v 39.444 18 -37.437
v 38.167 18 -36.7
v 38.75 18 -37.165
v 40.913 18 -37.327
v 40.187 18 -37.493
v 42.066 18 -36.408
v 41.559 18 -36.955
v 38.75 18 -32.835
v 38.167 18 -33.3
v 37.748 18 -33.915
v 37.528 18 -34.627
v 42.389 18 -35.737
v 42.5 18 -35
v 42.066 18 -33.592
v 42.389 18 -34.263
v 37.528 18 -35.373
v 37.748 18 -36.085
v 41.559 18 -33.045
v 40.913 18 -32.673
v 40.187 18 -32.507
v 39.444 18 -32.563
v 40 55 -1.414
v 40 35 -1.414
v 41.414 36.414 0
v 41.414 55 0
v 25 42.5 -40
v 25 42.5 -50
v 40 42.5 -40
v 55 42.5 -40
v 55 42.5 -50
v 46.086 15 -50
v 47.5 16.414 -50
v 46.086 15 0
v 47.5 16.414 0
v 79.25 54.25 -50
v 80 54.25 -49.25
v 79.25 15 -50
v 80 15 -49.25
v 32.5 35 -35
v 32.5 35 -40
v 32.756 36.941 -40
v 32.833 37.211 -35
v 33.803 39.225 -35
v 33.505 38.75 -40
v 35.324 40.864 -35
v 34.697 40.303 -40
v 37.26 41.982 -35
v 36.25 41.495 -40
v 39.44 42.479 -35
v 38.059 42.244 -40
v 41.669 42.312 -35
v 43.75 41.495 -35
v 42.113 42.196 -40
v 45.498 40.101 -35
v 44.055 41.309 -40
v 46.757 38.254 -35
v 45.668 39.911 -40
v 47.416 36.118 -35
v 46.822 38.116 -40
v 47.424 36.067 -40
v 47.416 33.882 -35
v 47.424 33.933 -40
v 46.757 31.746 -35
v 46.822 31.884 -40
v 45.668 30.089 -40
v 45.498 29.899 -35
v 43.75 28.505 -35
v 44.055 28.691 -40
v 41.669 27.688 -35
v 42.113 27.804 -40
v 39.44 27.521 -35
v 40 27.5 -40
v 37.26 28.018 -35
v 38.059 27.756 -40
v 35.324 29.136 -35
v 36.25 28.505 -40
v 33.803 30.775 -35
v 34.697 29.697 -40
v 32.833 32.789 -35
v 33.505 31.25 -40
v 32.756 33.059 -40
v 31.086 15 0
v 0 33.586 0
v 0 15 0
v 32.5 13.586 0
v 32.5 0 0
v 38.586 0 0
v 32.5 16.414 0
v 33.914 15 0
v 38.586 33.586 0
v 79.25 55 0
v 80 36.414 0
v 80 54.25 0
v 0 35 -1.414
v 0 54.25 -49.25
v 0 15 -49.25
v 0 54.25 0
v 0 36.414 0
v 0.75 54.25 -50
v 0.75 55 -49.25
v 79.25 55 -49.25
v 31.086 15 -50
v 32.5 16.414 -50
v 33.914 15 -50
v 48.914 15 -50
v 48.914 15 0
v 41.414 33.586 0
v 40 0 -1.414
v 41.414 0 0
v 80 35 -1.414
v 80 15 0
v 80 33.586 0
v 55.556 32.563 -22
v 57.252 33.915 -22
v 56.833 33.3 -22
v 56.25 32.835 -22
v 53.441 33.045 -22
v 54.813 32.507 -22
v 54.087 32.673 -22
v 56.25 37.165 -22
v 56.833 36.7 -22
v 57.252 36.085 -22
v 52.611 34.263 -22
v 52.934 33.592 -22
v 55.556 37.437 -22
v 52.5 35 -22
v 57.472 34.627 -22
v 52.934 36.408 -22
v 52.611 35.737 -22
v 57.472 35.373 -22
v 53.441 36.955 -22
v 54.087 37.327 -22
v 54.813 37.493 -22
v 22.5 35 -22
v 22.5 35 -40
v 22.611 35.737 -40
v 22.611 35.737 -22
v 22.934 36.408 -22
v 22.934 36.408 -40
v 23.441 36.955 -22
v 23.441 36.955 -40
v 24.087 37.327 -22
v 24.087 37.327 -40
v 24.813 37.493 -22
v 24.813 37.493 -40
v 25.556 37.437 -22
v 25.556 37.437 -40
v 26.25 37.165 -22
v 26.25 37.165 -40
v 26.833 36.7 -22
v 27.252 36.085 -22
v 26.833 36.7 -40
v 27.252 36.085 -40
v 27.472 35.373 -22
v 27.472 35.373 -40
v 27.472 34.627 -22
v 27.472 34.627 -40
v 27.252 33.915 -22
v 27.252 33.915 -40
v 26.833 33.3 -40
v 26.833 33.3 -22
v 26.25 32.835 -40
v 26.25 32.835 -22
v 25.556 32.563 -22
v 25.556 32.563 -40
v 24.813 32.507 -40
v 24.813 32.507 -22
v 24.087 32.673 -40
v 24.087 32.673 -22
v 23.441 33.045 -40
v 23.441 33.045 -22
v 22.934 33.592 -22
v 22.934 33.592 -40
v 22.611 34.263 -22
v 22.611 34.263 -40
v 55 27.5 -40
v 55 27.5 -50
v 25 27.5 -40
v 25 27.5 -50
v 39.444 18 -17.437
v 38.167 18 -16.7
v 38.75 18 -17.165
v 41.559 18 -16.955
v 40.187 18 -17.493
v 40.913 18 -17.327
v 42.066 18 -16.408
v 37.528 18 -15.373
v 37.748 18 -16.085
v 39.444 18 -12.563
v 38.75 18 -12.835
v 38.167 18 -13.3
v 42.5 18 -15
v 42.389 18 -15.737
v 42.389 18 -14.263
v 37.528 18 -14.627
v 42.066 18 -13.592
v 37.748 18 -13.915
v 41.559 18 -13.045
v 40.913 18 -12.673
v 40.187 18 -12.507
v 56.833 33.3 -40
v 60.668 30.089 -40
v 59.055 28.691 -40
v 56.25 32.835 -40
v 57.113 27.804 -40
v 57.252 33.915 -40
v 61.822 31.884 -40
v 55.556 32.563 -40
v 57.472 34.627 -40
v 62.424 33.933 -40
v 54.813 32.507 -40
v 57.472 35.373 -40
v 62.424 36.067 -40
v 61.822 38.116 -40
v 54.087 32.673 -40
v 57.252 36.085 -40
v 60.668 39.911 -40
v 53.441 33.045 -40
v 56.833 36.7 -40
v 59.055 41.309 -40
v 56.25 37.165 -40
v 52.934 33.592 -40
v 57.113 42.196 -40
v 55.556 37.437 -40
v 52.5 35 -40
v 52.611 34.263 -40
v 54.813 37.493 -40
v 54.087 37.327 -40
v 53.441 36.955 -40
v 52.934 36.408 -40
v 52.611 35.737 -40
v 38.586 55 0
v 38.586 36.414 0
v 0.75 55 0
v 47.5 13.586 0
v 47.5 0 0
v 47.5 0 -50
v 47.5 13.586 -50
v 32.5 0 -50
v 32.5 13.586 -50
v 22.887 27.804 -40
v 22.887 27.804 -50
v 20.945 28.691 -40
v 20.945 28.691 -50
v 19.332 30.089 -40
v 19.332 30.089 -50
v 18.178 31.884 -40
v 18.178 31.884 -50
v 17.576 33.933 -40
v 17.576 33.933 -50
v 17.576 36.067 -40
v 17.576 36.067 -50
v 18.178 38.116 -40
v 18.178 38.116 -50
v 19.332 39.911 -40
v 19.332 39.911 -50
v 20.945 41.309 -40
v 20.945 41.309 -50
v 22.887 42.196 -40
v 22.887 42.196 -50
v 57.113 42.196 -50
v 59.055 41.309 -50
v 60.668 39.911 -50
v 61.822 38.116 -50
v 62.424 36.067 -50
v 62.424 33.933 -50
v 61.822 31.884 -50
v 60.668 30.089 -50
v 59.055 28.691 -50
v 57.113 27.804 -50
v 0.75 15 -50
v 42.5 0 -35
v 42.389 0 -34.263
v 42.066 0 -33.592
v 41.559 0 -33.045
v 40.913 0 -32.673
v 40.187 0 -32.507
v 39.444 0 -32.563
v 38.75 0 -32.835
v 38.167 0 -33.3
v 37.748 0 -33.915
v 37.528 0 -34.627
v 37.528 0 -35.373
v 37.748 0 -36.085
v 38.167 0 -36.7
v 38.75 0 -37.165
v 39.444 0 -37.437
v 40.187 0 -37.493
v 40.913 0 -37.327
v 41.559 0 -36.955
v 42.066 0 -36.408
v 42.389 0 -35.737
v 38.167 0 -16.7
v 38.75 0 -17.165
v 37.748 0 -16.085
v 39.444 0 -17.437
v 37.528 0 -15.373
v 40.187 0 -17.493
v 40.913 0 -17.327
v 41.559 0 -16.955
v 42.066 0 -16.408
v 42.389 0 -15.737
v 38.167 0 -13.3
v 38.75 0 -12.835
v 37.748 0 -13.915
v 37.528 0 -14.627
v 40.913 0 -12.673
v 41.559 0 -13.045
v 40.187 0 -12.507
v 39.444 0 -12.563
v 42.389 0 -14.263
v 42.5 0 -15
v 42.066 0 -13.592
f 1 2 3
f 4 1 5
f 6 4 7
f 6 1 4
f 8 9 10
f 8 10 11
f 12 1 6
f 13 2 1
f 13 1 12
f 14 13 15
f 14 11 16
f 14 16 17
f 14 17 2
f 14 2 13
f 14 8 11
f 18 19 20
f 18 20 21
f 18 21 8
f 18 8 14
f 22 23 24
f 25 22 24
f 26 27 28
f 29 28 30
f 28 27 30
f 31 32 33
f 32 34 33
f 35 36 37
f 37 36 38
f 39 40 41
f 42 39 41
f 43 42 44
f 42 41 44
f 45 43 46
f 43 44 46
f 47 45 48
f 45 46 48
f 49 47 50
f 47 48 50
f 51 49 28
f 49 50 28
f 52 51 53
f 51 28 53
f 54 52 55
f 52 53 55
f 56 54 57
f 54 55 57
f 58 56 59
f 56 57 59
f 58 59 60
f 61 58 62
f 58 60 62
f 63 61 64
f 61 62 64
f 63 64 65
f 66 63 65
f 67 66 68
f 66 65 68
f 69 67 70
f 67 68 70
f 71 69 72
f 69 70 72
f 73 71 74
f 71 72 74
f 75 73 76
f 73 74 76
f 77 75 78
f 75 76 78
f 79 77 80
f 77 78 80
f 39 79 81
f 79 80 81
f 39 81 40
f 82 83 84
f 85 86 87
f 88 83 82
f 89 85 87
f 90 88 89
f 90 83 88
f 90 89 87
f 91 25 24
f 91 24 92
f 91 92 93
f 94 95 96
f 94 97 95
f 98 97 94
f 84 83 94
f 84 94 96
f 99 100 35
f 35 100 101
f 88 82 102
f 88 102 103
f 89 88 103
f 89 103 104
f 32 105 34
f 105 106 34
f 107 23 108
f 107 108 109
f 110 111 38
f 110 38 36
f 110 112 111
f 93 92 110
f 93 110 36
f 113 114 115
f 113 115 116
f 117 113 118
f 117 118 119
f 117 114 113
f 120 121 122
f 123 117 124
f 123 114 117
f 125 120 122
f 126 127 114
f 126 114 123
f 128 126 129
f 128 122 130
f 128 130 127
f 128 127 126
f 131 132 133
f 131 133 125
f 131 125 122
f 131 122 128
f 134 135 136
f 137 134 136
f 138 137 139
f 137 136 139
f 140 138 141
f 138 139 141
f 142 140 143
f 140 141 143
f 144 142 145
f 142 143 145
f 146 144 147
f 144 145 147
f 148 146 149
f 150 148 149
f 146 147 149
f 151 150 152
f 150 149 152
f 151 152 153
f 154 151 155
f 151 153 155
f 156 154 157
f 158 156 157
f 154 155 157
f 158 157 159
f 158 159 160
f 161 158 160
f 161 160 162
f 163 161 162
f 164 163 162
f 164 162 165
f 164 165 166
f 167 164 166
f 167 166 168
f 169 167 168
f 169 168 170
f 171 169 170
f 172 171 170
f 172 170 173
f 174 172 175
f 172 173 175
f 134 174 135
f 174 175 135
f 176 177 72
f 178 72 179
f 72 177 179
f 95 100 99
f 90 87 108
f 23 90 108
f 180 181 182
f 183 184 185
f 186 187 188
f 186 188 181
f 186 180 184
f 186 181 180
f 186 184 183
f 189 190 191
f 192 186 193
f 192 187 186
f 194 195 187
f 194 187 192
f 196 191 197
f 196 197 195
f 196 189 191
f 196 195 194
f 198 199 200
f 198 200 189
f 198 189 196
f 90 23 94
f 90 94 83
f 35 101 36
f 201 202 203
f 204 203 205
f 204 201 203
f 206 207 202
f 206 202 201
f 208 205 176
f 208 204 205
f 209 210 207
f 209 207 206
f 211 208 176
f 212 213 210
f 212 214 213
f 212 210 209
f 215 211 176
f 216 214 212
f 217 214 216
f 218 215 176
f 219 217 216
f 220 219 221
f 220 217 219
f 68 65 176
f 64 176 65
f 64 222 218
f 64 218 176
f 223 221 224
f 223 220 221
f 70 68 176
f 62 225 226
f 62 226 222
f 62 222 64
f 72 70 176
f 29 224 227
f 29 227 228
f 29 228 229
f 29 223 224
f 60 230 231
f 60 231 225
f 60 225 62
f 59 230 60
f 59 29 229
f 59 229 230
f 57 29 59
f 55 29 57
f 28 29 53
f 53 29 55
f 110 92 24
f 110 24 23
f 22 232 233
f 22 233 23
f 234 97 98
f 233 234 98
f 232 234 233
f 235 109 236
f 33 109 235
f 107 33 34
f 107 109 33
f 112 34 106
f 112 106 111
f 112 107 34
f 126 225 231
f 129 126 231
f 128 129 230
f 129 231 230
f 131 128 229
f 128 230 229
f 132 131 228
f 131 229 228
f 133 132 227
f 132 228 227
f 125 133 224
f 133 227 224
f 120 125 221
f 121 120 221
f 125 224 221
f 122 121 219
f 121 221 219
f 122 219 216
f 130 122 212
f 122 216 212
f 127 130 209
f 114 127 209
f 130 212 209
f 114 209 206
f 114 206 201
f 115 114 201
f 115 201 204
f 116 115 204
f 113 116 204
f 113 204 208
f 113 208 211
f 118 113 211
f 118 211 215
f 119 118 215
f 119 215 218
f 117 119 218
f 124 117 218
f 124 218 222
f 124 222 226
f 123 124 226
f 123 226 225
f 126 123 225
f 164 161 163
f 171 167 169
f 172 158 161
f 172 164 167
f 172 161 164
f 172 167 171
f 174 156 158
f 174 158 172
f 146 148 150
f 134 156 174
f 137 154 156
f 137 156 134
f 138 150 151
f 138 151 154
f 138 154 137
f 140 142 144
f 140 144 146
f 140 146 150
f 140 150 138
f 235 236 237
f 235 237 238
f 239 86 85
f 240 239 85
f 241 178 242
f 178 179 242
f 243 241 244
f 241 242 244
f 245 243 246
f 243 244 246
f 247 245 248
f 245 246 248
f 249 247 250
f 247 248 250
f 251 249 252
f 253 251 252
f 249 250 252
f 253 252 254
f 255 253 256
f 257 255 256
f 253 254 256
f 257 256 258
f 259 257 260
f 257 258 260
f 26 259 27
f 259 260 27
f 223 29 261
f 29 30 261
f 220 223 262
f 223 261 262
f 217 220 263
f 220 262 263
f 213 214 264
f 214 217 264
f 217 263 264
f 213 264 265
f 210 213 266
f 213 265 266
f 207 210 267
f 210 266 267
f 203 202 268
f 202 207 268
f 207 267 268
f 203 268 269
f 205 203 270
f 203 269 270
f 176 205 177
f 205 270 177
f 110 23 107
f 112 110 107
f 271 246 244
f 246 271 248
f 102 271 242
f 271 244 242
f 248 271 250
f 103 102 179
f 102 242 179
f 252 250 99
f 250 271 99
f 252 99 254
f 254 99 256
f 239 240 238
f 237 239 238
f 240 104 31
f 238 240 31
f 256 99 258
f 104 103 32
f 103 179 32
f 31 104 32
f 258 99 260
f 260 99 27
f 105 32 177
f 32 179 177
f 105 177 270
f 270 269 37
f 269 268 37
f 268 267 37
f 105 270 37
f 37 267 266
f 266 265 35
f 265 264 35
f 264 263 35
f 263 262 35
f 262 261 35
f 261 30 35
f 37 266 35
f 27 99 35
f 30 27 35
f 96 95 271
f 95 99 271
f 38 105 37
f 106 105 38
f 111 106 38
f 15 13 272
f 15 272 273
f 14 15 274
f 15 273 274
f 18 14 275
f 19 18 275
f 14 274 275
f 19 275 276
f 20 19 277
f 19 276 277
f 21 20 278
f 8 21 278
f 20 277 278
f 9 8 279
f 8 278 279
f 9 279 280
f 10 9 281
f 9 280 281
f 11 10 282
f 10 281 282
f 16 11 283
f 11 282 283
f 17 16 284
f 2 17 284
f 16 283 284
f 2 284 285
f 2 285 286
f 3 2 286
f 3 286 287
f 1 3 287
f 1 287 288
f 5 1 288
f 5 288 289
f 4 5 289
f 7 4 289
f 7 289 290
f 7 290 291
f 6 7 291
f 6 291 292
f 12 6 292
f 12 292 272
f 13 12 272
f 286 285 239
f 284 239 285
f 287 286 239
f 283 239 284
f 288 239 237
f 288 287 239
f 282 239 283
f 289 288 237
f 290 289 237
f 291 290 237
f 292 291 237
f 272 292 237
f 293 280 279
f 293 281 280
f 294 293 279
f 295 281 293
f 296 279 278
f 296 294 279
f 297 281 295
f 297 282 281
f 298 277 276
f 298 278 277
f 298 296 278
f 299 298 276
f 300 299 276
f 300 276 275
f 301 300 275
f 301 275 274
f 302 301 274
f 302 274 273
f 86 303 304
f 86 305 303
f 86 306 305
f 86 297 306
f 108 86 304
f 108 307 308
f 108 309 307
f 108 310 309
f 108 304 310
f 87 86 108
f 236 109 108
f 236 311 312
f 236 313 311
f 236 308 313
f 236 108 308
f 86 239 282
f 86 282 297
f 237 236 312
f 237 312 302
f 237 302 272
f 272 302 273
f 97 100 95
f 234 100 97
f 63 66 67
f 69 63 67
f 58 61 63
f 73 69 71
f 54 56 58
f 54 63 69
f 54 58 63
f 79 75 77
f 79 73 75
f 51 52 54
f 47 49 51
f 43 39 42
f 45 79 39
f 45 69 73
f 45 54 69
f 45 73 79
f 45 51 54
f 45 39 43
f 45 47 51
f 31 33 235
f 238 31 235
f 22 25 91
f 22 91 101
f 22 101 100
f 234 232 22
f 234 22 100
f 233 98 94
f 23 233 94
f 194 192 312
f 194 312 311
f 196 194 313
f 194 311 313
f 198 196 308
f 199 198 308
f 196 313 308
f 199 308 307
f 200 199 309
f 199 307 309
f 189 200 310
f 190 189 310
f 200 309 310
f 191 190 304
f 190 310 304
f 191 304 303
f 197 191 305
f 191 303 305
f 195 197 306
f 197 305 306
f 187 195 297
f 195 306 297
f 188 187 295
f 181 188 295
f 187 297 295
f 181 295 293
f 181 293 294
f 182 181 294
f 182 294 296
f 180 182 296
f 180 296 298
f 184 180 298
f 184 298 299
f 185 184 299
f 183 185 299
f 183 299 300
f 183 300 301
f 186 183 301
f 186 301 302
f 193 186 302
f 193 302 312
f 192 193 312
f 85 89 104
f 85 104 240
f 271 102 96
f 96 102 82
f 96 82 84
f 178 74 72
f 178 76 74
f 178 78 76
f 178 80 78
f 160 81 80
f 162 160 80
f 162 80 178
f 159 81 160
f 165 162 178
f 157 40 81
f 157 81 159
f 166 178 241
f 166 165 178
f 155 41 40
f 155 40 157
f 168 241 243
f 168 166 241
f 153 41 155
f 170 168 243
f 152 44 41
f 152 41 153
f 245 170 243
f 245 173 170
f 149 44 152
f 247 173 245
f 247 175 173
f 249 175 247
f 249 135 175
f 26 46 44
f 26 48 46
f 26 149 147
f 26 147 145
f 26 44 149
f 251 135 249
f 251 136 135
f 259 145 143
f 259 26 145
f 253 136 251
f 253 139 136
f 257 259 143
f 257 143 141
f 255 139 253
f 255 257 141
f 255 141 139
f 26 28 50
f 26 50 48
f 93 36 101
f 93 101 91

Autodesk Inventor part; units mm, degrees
ref_plane "YZ Plane" through (0, 0, 0) normal (1, 0, 0) x (0, 1, 0)
ref_plane "XZ Plane" through (0, 0, 0) normal (0, 1, 0) x (-1, 0, 0)
ref_plane "XY Plane" through (0, 0, 0) normal (0, 0, 1) x (1, 0, 0)
sketch "Sketch1" plane through (0, 0, 0) normal (0, 0, 1) x (1, 0, 0)
  line L0 (0, 0) -> (80, 0)
  line L1 (80, 0) -> (80, 55)
  line L2 (80, 55) -> (0, 55)
  line L3 (0, 55) -> (0, 0)
  dimension "d0" = 55
  dimension "d1" = 80
extrude "Extrusion1" add sketch "Sketch1" against normal blind 50
sketch "Sketch2" plane through (0, 0, 0) normal (0, 0, 1) x (1, 0, 0)
  line L0 (0, 0) -> (32.5, 0)
  line L1 (32.5, 0) -> (32.5, 15)
  line L2 (32.5, 15) -> (0, 15)
  line L3 (0, 15) -> (0, 0)
  line L4 (80, 55) -> (80, 0) projected
  line L5 (80, 0) -> (47.5, 0)
  line L6 (47.5, 0) -> (47.5, 15)
  line L7 (47.5, 15) -> (80, 15)
  line L8 (80, 15) -> (80, 0)
  dimension "d4" = 15
  dimension "d5" = 15
extrude "Extrusion2" cut sketch "Sketch2" against normal through all
sketch "Sketch3" plane through (0, 0, 0) normal (0, 0, 1) x (1, 0, 0)
  line L0 (32.5, 13.5858) -> (31.0858, 15)
  line L1 (31.0858, 15) -> (32.5, 16.4142)
  line L2 (32.5, 16.4142) -> (33.9142, 15)
  line L3 (33.9142, 15) -> (32.5, 13.5858)
  line L4 (32.5, 15) -> (32.5, 0) projected
  line L5 (32.5, 13.5858) -> (32.5, 16.4142) construction
  line L6 (31.0858, 15) -> (33.9142, 15) construction
  line L7 (47.5, 13.5858) -> (48.9142, 15)
  line L8 (48.9142, 15) -> (47.5, 16.4142)
  line L9 (47.5, 16.4142) -> (46.0858, 15)
  line L10 (46.0858, 15) -> (47.5, 13.5858)
  line L11 (47.5, 15) -> (80, 15) projected
  line L12 (47.5, 13.5858) -> (47.5, 16.4142) construction
  line L13 (48.9142, 15) -> (46.0858, 15) construction
  point P0 (0, 0)
  dimension "d8" = 2
extrude "Extrusion3" cut sketch "Sketch3" against normal through all
sketch "Sketch4" plane through (80, 55, 0) normal (1, 0, 0) x (0, 0, -1)
  line L0 (-1.4142, -20) -> (0, -18.5858)
  line L1 (0, -18.5858) -> (1.4142, -20)
  line L2 (1.4142, -20) -> (0, -21.4142)
  line L3 (0, -21.4142) -> (-1.4142, -20)
  line L4 (0, -40) -> (0, 0) projected
  line L5 (-1.4142, -20) -> (1.4142, -20) construction
  line L6 (0, -18.5858) -> (0, -21.4142) construction
  line L7 (0, 0) -> (50, 0) projected
  point P0 (0, -55)
  point P1 (0, -20)
  dimension "d11" = 2
  dimension "d12" = 20
extrude "Extrusion4" cut sketch "Sketch4" against normal through all
sketch "Sketch5" plane through (0, 55, 0) normal (0, 1, 0) x (1, 0, 0)
  line L0 (40, -1.4142) -> (38.5858, 0)
  line L1 (38.5858, 0) -> (40, 1.4142)
  line L2 (40, 1.4142) -> (41.4142, 0)
  line L3 (41.4142, 0) -> (40, -1.4142)
  line L4 (32.5, 0) -> (47.5, 0) projected
  line L5 (40, -1.4142) -> (40, 1.4142) construction
  line L6 (38.5858, 0) -> (41.4142, 0) construction
  point P0 (0, 0)
  point P1 (40, 0)
  dimension "d15" = 2
extrude "Extrusion5" cut sketch "Sketch5" against normal through all
sketch "Sketch6" plane through (0, 0, -50) normal (0, 0, -1) x (-1, 0, 0)
  line L0 (-55, 35) -> (-25, 35) construction
  line L1 (-41.4142, 36.4142) -> (-80, 36.4142) projected
  line L2 (-55, 27.5) -> (-25, 27.5)
  line L3 (-25, 42.5) -> (-55, 42.5)
  arc A0 (-55, 42.5) -> (-55, 27.5) centre (-55, 35) ccw
  arc A1 (-25, 27.5) -> (-25, 42.5) centre (-25, 35) ccw
  line L4 (0, 55) -> (-80, 55) projected
  line L5 (-80, 55) -> (-80, 15) projected
  point P0 (0, 0)
  point P1 (-40, 35)
  dimension "d18" = 7.5
  dimension "d19" = 20
  dimension "d20" = 40
  dimension "d21" = 30
extrude "Extrusion6" cut sketch "Sketch6" against normal blind 10
sketch "Sketch7" plane through (0, 0, -40) normal (0, 0, -1) x (-1, 0, 0)
  line L0 (-80, 35) -> (-40, 35) projected
  circle A0 centre (-40, 35) radius 7.5
  point P0 (0, 0)
  dimension "d24" = 15
extrude "Extrusion7" cut sketch "Sketch7" against normal blind 5
sketch "Sketch8" plane through (0, 0, -40) normal (0, 0, -1) x (-1, 0, 0)
  line L0 (-80, 35) -> (-40, 35) projected
  circle A0 centre (-55, 35) radius 2.5
  line L1 (-40, 35) -> (0, 35) projected
  circle A1 centre (-25, 35) radius 2.5
  point P0 (0, 0)
  dimension "d27" = 5
  dimension "d28" = 15
  dimension "d29" = 15
extrude "Extrusion8" cut sketch "Sketch8" against normal blind 18
thread "Thread1" size "M6x1" class "6H" standard "ANSI Metric M Profile" length 15
thread "Thread2" size "M5x0.8" class "6H" standard "ANSI Metric M Profile" length 15
chamfer "Chamfer1" distance 0.75 angle 45 5 edges at (40, 55, -50) (80, 55, -25) (0, 55, -25) (0, 35, -50) (80, 35, -50)
sketch "Sketch9" plane through (32.5, 0, -50) normal (0, -1, 0) x (1, 0, 0)
  circle A0 centre (7.5, 35) radius 2.5
  circle A1 centre (7.5, 15) radius 2.5
  line L0 (15, 0) -> (0, 0) projected
  point P0 (-32.5, 50)
  point P1 (7.5, 48.5858)
  dimension "d39" = 5
  dimension "d40" = 20
  dimension "d41" = 15
extrude "Extrusion9" cut sketch "Sketch9" against normal blind 18
thread "Thread3" size "M6x1" class "6H" standard "ANSI Metric M Profile" length 15
thread "Thread4" size "M6x1" class "6H" standard "ANSI Metric M Profile" length 15
